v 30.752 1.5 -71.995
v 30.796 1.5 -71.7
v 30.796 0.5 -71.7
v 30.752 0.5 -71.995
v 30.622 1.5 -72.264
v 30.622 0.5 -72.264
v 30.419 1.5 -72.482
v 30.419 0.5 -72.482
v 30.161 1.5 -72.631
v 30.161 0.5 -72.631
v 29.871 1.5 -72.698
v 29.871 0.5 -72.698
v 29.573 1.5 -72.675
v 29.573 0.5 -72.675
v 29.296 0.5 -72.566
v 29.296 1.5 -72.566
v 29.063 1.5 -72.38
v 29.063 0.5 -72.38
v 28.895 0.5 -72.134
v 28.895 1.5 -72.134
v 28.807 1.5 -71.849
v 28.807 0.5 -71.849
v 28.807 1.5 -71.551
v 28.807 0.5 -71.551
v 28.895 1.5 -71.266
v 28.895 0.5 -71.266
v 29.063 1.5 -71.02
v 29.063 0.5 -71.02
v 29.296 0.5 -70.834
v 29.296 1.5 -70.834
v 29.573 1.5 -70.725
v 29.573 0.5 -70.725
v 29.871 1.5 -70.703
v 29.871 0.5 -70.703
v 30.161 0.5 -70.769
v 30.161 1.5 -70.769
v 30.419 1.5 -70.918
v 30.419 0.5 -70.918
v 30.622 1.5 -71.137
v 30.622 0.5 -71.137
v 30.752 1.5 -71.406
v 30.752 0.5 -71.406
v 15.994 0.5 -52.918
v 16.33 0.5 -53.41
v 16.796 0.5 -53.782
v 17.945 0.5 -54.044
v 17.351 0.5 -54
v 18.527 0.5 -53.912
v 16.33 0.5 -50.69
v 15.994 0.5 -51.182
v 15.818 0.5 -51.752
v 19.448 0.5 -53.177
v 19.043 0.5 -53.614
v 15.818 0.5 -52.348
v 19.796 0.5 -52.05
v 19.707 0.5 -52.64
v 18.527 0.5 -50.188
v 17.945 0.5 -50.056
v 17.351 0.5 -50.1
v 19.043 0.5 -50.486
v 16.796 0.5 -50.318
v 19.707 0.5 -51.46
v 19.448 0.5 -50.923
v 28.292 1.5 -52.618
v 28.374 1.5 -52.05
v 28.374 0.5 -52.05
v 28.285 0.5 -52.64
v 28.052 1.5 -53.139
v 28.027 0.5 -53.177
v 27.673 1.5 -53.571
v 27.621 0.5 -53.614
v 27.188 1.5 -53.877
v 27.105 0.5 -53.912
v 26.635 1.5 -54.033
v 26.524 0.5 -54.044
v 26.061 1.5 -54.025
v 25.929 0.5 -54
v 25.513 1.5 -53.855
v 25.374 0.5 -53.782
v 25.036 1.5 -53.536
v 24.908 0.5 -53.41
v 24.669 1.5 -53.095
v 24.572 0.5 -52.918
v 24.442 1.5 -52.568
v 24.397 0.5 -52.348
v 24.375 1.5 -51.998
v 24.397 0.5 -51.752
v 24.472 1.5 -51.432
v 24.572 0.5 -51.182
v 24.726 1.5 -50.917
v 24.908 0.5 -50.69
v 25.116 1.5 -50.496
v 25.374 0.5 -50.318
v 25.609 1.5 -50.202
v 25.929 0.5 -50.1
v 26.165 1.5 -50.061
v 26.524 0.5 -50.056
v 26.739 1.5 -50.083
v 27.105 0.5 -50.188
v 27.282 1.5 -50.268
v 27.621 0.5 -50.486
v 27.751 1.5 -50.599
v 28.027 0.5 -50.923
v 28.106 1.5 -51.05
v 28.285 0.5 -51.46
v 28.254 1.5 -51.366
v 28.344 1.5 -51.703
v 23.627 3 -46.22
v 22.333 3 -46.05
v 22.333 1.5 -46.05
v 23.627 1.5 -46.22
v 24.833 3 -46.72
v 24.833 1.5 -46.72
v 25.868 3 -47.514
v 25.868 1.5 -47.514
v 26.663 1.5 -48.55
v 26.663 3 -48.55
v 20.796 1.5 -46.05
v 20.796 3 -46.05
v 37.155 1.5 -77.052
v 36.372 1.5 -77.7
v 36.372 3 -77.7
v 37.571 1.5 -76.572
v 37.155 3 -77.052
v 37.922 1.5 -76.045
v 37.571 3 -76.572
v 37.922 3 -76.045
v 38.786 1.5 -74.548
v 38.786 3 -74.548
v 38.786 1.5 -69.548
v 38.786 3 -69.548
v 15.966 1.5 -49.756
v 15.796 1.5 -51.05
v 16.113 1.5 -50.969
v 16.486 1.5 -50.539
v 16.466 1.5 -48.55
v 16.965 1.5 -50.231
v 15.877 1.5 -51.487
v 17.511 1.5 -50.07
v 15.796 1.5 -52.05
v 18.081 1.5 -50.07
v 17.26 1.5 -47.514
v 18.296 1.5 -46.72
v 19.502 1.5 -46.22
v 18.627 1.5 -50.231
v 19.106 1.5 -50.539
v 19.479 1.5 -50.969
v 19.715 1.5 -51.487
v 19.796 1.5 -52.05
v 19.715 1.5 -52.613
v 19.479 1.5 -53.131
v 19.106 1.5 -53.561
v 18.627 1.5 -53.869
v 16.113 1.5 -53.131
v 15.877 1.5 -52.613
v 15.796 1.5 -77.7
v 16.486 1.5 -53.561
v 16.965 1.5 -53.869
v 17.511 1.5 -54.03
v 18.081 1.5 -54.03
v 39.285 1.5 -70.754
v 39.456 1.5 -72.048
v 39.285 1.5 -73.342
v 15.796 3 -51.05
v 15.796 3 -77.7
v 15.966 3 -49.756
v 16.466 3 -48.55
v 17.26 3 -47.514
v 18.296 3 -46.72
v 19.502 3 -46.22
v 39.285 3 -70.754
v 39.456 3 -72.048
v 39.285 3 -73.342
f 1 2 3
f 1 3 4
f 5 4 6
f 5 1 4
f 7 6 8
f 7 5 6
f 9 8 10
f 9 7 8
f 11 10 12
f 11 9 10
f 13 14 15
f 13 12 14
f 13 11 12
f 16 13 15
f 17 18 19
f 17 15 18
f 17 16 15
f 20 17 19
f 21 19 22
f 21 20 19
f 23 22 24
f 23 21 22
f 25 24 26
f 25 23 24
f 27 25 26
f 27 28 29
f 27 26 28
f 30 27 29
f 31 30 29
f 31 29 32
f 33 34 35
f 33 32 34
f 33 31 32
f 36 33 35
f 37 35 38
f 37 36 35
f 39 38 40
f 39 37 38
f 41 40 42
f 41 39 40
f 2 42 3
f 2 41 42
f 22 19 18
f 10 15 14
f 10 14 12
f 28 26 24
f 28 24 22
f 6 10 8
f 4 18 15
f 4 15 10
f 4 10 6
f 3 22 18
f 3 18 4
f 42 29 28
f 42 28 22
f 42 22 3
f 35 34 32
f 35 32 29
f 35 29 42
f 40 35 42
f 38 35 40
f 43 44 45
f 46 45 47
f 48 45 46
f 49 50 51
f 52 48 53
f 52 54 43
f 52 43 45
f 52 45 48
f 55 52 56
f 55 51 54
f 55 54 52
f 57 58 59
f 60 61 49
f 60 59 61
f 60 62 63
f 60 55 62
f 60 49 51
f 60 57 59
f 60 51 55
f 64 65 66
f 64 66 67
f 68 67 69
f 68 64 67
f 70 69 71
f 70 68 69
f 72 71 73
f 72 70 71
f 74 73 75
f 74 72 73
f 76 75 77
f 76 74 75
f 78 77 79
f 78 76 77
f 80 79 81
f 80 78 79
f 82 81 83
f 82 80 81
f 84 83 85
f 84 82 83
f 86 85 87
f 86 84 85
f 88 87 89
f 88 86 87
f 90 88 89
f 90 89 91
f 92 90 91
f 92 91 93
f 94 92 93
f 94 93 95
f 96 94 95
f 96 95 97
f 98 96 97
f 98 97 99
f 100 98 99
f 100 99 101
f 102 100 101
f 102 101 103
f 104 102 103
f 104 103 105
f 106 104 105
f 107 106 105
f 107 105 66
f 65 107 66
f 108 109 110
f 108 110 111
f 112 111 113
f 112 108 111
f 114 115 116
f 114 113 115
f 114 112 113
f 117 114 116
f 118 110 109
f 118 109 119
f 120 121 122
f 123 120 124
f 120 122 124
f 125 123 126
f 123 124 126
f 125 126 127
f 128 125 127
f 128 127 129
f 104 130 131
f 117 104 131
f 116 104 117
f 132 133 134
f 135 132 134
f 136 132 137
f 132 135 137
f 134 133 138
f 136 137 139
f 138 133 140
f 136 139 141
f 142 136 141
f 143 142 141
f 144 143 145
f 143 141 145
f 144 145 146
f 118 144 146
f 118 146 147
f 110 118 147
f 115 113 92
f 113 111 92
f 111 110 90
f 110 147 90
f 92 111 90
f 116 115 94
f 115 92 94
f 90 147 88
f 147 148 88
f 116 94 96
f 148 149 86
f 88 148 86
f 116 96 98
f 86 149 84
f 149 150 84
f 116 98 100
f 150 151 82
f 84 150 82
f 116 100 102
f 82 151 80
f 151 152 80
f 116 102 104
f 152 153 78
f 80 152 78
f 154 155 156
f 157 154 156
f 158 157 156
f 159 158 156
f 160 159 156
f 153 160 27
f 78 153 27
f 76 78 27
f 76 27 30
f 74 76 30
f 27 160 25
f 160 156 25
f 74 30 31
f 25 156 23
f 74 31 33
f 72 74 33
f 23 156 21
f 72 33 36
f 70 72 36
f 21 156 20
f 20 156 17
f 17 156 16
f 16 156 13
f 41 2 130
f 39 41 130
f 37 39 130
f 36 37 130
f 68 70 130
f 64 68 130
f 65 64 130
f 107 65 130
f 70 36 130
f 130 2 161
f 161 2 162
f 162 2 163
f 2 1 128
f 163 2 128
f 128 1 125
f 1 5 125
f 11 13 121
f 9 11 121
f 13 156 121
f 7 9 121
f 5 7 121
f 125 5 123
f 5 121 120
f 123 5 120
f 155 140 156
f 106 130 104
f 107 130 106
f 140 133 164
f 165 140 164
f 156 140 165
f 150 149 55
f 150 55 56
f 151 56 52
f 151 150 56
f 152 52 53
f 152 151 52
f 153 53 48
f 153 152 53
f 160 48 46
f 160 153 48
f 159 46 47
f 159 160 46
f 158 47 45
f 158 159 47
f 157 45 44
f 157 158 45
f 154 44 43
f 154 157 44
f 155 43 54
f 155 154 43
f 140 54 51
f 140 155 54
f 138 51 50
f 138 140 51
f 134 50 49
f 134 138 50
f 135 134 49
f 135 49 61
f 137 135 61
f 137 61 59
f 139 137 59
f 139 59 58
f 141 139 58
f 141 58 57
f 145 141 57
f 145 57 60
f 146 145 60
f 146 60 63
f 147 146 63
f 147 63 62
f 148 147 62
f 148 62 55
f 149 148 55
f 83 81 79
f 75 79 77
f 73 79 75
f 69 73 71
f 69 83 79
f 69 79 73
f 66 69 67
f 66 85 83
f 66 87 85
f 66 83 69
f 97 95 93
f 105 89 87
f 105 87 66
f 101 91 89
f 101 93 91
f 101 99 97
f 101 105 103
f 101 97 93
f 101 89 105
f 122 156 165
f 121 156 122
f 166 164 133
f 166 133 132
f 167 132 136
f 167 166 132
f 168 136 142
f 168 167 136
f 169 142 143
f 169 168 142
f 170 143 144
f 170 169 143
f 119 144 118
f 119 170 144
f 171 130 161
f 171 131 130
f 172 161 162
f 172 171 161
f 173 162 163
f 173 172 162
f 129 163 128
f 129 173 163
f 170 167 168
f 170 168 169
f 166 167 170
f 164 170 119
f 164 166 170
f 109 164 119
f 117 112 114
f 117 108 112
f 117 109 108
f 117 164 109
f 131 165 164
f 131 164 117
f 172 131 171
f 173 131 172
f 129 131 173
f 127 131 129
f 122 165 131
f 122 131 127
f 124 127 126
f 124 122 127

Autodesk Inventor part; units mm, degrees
ref_plane "YZ Plane" through (0, 0, 0) normal (1, 0, 0) x (0, 1, 0)
ref_plane "XZ Plane" through (0, 0, 0) normal (0, 1, 0) x (-1, 0, 0)
ref_plane "XY Plane" through (0, 0, 0) normal (0, 0, 1) x (1, 0, 0)
sketch "スケッチ1" plane through (0, 0, 0) normal (0, 1, 0) x (-1, 0, 0)
  line L0 (75, 0) -> (105, -51.9615)
  line L1 (-75, 0) -> (-105, -51.9615)
  line L2 (0, -218.2384) -> (0, 36.3731)
  line L3 (147, 0) -> (-147, 0)
  line L4 (37.5, -27) -> (-37.5, -27)
  line L5 (105, -51.9615) -> (30, -181.8653)
  line L6 (30, -181.8653) -> (-30, -181.8653)
  line L7 (-30, -181.8653) -> (-105, -51.9615)
  line L8 (75, 0) -> (-75, 0)
  line L9 (-25.3673, -135.8894) -> (-62.8673, -70.9375)
  line L10 (25.3673, -135.8894) -> (62.8673, -70.9375)
  line L11 (-37.5, -27) -> (-27.5, -27)
  line L12 (-27.5, -27) -> (-27.5, -39)
  line L13 (-27.5, -39) -> (-37.5, -39)
  line L14 (-37.5, -39) -> (-37.5, -27)
  line L15 (37.5, -27) -> (27.5, -27)
  line L16 (27.5, -27) -> (27.5, -39)
  line L17 (27.5, -39) -> (37.5, -39)
  line L18 (37.5, -39) -> (37.5, -27)
  line L19 (0, -77.9423) -> (44.1173, -103.4134) construction
  line L20 (0, -77.9423) -> (-44.1173, -103.4134) construction
  line L21 (-44.1173, -103.4134) -> (-67.5, -116.9134) construction
  line L22 (-57.8673, -79.5977) -> (-47.475, -73.5977)
  line L23 (-52.475, -64.9375) -> (-62.8673, -70.9375)
  line L24 (-62.8673, -70.9375) -> (-57.8673, -79.5977)
  line L25 (-47.475, -73.5977) -> (-52.475, -64.9375)
  line L26 (-25.3673, -135.8894) -> (-30.3673, -127.2291)
  line L27 (-19.975, -121.2291) -> (-14.975, -129.8894)
  line L28 (-14.975, -129.8894) -> (-25.3673, -135.8894)
  line L29 (-30.3673, -127.2291) -> (-19.975, -121.2291)
  line L30 (30.3673, -127.2291) -> (19.975, -121.2291)
  line L31 (14.975, -129.8894) -> (25.3673, -135.8894)
  line L32 (25.3673, -135.8894) -> (30.3673, -127.2291)
  line L33 (19.975, -121.2291) -> (14.975, -129.8894)
  line L34 (62.8673, -70.9375) -> (57.8673, -79.5977)
  line L35 (47.475, -73.5977) -> (52.475, -64.9375)
  line L36 (52.475, -64.9375) -> (62.8673, -70.9375)
  line L37 (57.8673, -79.5977) -> (47.475, -73.5977)
  line L38 (62.8673, -70.9375) -> (37.5, -27)
  line L39 (-37.5, -27) -> (-62.8673, -70.9375)
  line L40 (-25.3673, -135.8894) -> (25.3673, -135.8894)
  line L41 (-25.3673, -135.8894) -> (-25.3673, -181.8653)
  line L42 (25.3673, -135.8894) -> (25.3673, -181.8653)
  line L43 (-25.3673, -135.8894) -> (-48.75, -149.3894)
  line L44 (25.3673, -135.8894) -> (48.75, -149.3894)
  point P0 (0, 0)
  point P1 (0, 0)
  point P2 (0, -27)
  dimension "d1" = 150
  dimension "d2" = 60
  dimension "d3" = 60
  dimension "d4" = 27
  dimension "d5" = 75
  dimension "d6" = 60
  dimension "d7" = 27
  dimension "d8" = 10
  dimension "d9" = 12
  dimension "d10" = 10
  dimension "d11" = 12
  dimension "d14" = 360
extrude "プレート1" add sketch "スケッチ1" along normal blind 1.5 contours L5 L6 L42 L44 | L4 L16 L17 L18 L38 L36 L35 L37 L10 L30 L33 L31 L40 L2 | L2 L40 L28 L27 L29 L9 L22 L25 L23 L39 L14 L13 L12 L4 | L31 L33 L30 L10 | L42 L6 L2 L40 | L2 L6 L41 L40 | L4 L18 L17 L16 | L12 L13 L14 L4 | L9 L29 L27 L28 | L41 L6 L7 L43 | L37 L35 L36 L10 | L23 L25 L22 L9
sketch "スケッチ2" plane through (0, 0, 0) normal (0, -1, 0) x (1, 0, 0)
  line L0 (23.3798, -38.55) -> (-23.3798, -38.55) projected
  line L1 (8.2, -46.6) -> (-8.2, -46.6) projected
  arc A0 (-21.1, -27) -> (-23.3798, -38.55) centre (-21.1, -33) ccw projected
  line L2 (-27.5, -27) -> (-27.5, -39) projected
  line L3 (27.5, -39) -> (27.5, -27) projected
  line L4 (-27.5, -39) -> (-27.5, -40.55)
  line L5 (-27.5, -40.55) -> (-10.2, -40.55)
  line L6 (-10.2, -40.55) -> (-10.2, -48.6)
  line L7 (-10.2, -48.6) -> (10.2, -48.6)
  line L8 (10.2, -48.6) -> (10.2, -40.55)
  line L9 (10.2, -40.55) -> (27.5, -40.55)
  line L10 (27.5, -40.55) -> (27.5, -39)
  line L11 (-37.5, -27) -> (-27.5, -27) projected
  line L12 (-37.5, -27) -> (37.5, -27) projected
  line L13 (-20.3112, -101.4469) -> (-30.5112, -83.78)
  line L14 (-27.2827, -105.4719) -> (-20.3112, -101.4469)
  line L15 (-18.6327, -120.4541) -> (-27.2827, -105.4719)
  line L16 (-19.975, -121.2291) -> (-18.6327, -120.4541)
  line L17 (-37.4827, -87.805) -> (-46.1327, -72.8227)
  line L18 (-46.1327, -72.8227) -> (-47.475, -73.5977)
  line L19 (-30.5112, -83.78) -> (-37.4827, -87.805)
  line L20 (30.5112, -83.78) -> (20.3112, -101.4469)
  line L21 (37.4827, -87.805) -> (30.5112, -83.78)
  line L22 (46.1327, -72.8227) -> (37.4827, -87.805)
  line L23 (47.475, -73.5977) -> (46.1327, -72.8227)
  line L24 (27.2827, -105.4719) -> (18.6327, -120.4541)
  line L25 (18.6327, -120.4541) -> (19.975, -121.2291)
  line L26 (20.3112, -101.4469) -> (27.2827, -105.4719)
  line L27 (-47.475, -73.5977) -> (-57.8673, -79.5977)
  line L28 (-57.8673, -79.5977) -> (-30.3673, -127.2291)
  line L29 (-30.3673, -127.2291) -> (-19.975, -121.2291)
  line L30 (19.975, -121.2291) -> (30.3673, -127.2291)
  line L31 (30.3673, -127.2291) -> (57.8673, -79.5977)
  line L32 (57.8673, -79.5977) -> (47.475, -73.5977)
  point P0 (0, 0)
  point P1 (0, -77.9423)
  point P2 (-23.0432, -100.7148)
  point P3 (-33.5673, -121.6866)
  point P4 (-22.4248, -117.8859)
  point P5 (-25.3673, -135.8894)
  point P6 (-28.3712, -118.6866)
  point P7 (-31.2432, -86.512)
  point P8 (-45.8046, -77.3909)
  point P9 (-62.8673, -70.9375)
  point P10 (31.2432, -86.512)
  point P11 (54.6673, -85.1403)
  point P12 (45.8046, -77.3909)
  point P13 (62.8673, -70.9375)
  point P14 (49.4712, -82.1403)
  point P15 (23.0432, -100.7148)
  point P16 (22.4248, -117.8859)
  point P17 (25.3673, -135.8894)
  dimension "d17" = 2
  dimension "d18" = 2
  dimension "d19" = 2
  dimension "d20" = 2
  dimension "d26" = 360
extrude "切り取り1" cut sketch "スケッチ2" against normal blind 1.5
fillet "フィレット1" radius 1.5 18 edges at (-10.2, 0.75, -48.6) (-10.2, 0.75, -40.55) (-27.5, 0.75, -40.55) (10.2, 0.75, -48.6) (10.2, 0.75, -40.55) (27.5, 0.75, -40.55) (-30.5112, 0.75, -83.78) (-46.1327, 0.75, -72.8227) (-20.3112, 0.75, -101.4469) (-27.2827, 0.75, -105.4719) (-37.4827, 0.75, -87.805) (-18.6327, 0.75, -120.4541) (20.3112, 0.75, -101.4469) (27.2827, 0.75, -105.4719) (18.6327, 0.75, -120.4541) (30.5112, 0.75, -83.78) (37.4827, 0.75, -87.805) (46.1327, 0.75, -72.8227)
sketch "スケッチ3" plane through (0, 0, 0) normal (0, -1, 0) x (1, 0, 0)
  circle A0 centre (40.9875, -45.0405) radius 1.6 projected
  circle A1 centre (48.9875, -58.8969) radius 1.6 projected
  circle A2 centre (8, -129.8894) radius 1.6 projected
  circle A3 centre (-8, -129.8894) radius 1.6 projected
  circle A4 centre (-48.9875, -58.8969) radius 1.6 projected
  circle A5 centre (-40.9875, -45.0405) radius 1.6 projected
  point P0 (0, 0)
extrude "切り取り2" cut sketch "スケッチ3" against normal blind 1.5
sketch "スケッチ4" plane through (0, 0, 0) normal (0, -1, 0) x (1, 0, 0)
  circle A0 centre (10, -176.8653) radius 1.35 projected
  circle A1 centre (21.2333, -145.0496) radius 1.6 projected
  circle A2 centre (10, -143.8894) radius 1.6 projected
  line L0 (52.75, -142.4612) -> (30, -181.8653) projected
  line L1 (52.75, -142.4612) -> (33.6974, -131.4612) projected
  line L2 (33.6974, -131.4612) -> (27.1974, -142.7195) projected
  line L3 (27.1974, -142.7195) -> (20.5635, -138.8894) projected
  line L4 (20.5635, -138.8894) -> (5, -138.8894) projected
  line L5 (5, -138.8894) -> (5, -181.8653) projected
  line L6 (30, -181.8653) -> (5, -181.8653) projected
  circle A3 centre (-10, -176.8653) radius 1.35 projected
  circle A4 centre (-21.2333, -145.0496) radius 1.6 projected
  circle A5 centre (-10, -143.8894) radius 1.6 projected
  line L7 (-12.9295, -171.4323) -> (-35.4295, -132.4612) projected
  line L8 (-30.25, -181.4323) -> (-12.9295, -171.4323) projected
  line L9 (-30, -181.8653) -> (-30.25, -181.4323) projected
  line L10 (-30, -181.8653) -> (-5, -181.8653) projected
  line L11 (-5, -181.8653) -> (-5, -138.8894) projected
  line L12 (-5, -138.8894) -> (-20.5635, -138.8894) projected
  line L13 (-20.5635, -138.8894) -> (-27.1974, -142.7195) projected
  line L14 (-33.6974, -131.4612) -> (-27.1974, -142.7195) projected
  line L15 (-35.4295, -132.4612) -> (-33.6974, -131.4612) projected
  point P0 (0, 0)
extrude "切り取り3" cut sketch "スケッチ4" against normal blind 1.5 contours A0 | A1 | A2 | A3 | A4 | A5
sketch "スケッチ5" plane through (0, 1.5, 0) normal (0, 1, 0) x (1, 0, 0)
  line L0 (-19.975, 121.2291) -> (19.975, 121.2291) projected
  line L1 (47.475, 73.5977) -> (27.5, 39) projected
  line L2 (-47.475, 73.5977) -> (-27.5, 39) projected
  point P0 (0, 0)
sketch "スケッチ6" plane through (0, 1.5, 0) normal (0, 1, 0) x (1, 0, 0)
  line L0 (-26.0855, 44.55) -> (-41.9613, 72.0477)
  line L1 (-41.9613, 72.0477) -> (-36.0186, 82.3409)
  line L2 (-36.0186, 82.3409) -> (-29.0471, 78.3159)
  line L3 (-29.0471, 78.3159) -> (-14.8471, 102.911)
  line L4 (-14.8471, 102.911) -> (-21.8186, 106.936)
  line L5 (-21.8186, 106.936) -> (-15.8758, 117.2291)
  line L6 (-15.8758, 117.2291) -> (15.8758, 117.2291)
  line L7 (15.8758, 117.2291) -> (21.8186, 106.936)
  line L8 (21.8186, 106.936) -> (14.8471, 102.911)
  line L9 (14.8471, 102.911) -> (29.0471, 78.3159)
  line L10 (29.0471, 78.3159) -> (36.0186, 82.3409)
  line L11 (36.0186, 82.3409) -> (41.9613, 72.0477)
  line L12 (41.9613, 72.0477) -> (26.0855, 44.55)
  line L13 (26.0855, 44.55) -> (14.2, 44.55)
  line L14 (14.2, 44.55) -> (14.2, 52.6)
  line L15 (14.2, 52.6) -> (-14.2, 52.6)
  line L16 (-14.2, 52.6) -> (-14.2, 44.55)
  line L17 (-14.2, 44.55) -> (-26.0855, 44.55)
  line L18 (-47.475, 73.5977) -> (-27.5, 39) projected
  line L19 (-38.2327, 86.5059) -> (-45.3827, 74.1218) projected
  line L20 (-31.8102, 84.53) -> (-36.1836, 87.055) projected
  line L21 (-21.0612, 100.1479) -> (-29.7612, 85.079) projected
  line L22 (-25.9836, 104.7219) -> (-21.6102, 102.1969) projected
  line L23 (-19.3827, 119.1551) -> (-26.5327, 106.7709) projected
  line L24 (-19.975, 121.2291) -> (19.975, 121.2291) projected
  line L25 (47.475, 73.5977) -> (27.5, 39) projected
  line L26 (26.5327, 106.7709) -> (19.3827, 119.1551) projected
  line L27 (21.6102, 102.1969) -> (25.9836, 104.7219) projected
  line L28 (29.7612, 85.079) -> (21.0612, 100.1479) projected
  line L29 (36.1836, 87.055) -> (31.8102, 84.53) projected
  line L30 (45.3827, 74.1218) -> (38.2327, 86.5059) projected
  line L31 (11.7, 40.55) -> (26, 40.55) projected
  line L32 (10.2, 47.1) -> (10.2, 42.05) projected
  line L33 (-8.7, 48.6) -> (8.7, 48.6) projected
  line L34 (-10.2, 42.05) -> (-10.2, 47.1) projected
  line L35 (-26, 40.55) -> (-11.7, 40.55) projected
  line L36 (0, 48.6) -> (0, 121.2291)
  line L37 (-25.4112, 92.6134) -> (-31.0836, 95.8884) construction
  point P0 (0, 0)
  dimension "d32" = 4
  dimension "d33" = 4
  dimension "d34" = 4
  dimension "d35" = 4
  dimension "d36" = 4
  dimension "d37" = 4
  dimension "d38" = 4
  dimension "d39" = 4
  dimension "d40" = 4
extrude "切り取り4" cut sketch "スケッチ6" against normal blind 1.5
fillet "フィレット2" radius 5 9 edges at (-14.2, 0.75, -44.55) (-26.0855, 0.75, -44.55) (-41.9613, 0.75, -72.0477) (-36.0186, 0.75, -82.3409) (-21.8186, 0.75, -106.936) (-15.8758, 0.75, -117.2291) (-14.2, 0.75, -52.6) (-29.0471, 0.75, -78.3159) (-14.8471, 0.75, -102.911)
mirror "ミラー1" about plane through (0, 0, 0) normal (1, 0, 0) of "フィレット2"
sketch "スケッチ7" plane through (0, 1.5, 0) normal (0, 1, 0) x (1, 0, 0)
  arc A0 (18.2848, 105.0066) -> (17.2511, 98.7471) centre (21.5812, 101.2471) ccw projected
  line L0 (17.2511, 98.7471) -> (26.643, 82.4797) projected
  arc A1 (26.643, 82.4797) -> (32.5808, 80.2452) centre (30.9732, 84.9797) ccw projected
  arc A2 (38.5186, 78.0107) -> (32.5808, 80.2452) centre (34.1884, 75.5107) ccw projected
  line L1 (38.5186, 78.0107) -> (40.5179, 74.5477) projected
  arc A3 (40.5179, 69.5477) -> (40.5179, 74.5477) centre (36.1878, 72.0477) ccw projected
  line L2 (40.5179, 69.5477) -> (27.5289, 47.05) projected
  arc A4 (23.1987, 44.55) -> (27.5289, 47.05) centre (23.1987, 49.55) ccw projected
  line L3 (23.1987, 44.55) -> (19.2, 44.55) projected
  arc A5 (14.296, 48.575) -> (19.2, 44.55) centre (19.2, 49.55) ccw projected
  arc A6 (14.296, 48.575) -> (9.392, 52.6) centre (9.392, 47.6) ccw projected
  line L4 (9.392, 52.6) -> (-9.392, 52.6) projected
  arc A7 (-9.392, 52.6) -> (-14.296, 48.575) centre (-9.392, 47.6) ccw projected
  arc A8 (-19.2, 44.55) -> (-14.296, 48.575) centre (-19.2, 49.55) ccw projected
  line L5 (-19.2, 44.55) -> (-23.1987, 44.55) projected
  arc A9 (-27.5289, 47.05) -> (-23.1987, 44.55) centre (-23.1987, 49.55) ccw projected
  line L6 (-27.5289, 47.05) -> (-40.5179, 69.5477) projected
  arc A10 (-40.5179, 74.5477) -> (-40.5179, 69.5477) centre (-36.1878, 72.0477) ccw projected
  line L7 (-40.5179, 74.5477) -> (-38.5186, 78.0107) projected
  arc A11 (-32.5808, 80.2452) -> (-38.5186, 78.0107) centre (-34.1884, 75.5107) ccw projected
  arc A12 (-32.5808, 80.2452) -> (-26.643, 82.4797) centre (-30.9732, 84.9797) ccw projected
  line L8 (-26.643, 82.4797) -> (-17.2511, 98.7471) projected
  arc A13 (-17.2511, 98.7471) -> (-18.2848, 105.0066) centre (-21.5812, 101.2471) ccw projected
  arc A14 (-19.3186, 111.2661) -> (-18.2848, 105.0066) centre (-14.9884, 108.7661) ccw projected
  line L9 (-19.3186, 111.2661) -> (-17.3192, 114.7291) projected
  arc A15 (-12.9891, 117.2291) -> (-17.3192, 114.7291) centre (-12.9891, 112.2291) ccw projected
  line L10 (-12.9891, 117.2291) -> (12.9891, 117.2291) projected
  arc A16 (17.3192, 114.7291) -> (12.9891, 117.2291) centre (12.9891, 112.2291) ccw projected
  line L11 (17.3192, 114.7291) -> (19.3186, 111.2661) projected
  arc A17 (18.2848, 105.0066) -> (19.3186, 111.2661) centre (14.9884, 108.7661) ccw projected
  circle A18 centre (21.2333, 145.0496) radius 1.6 projected
  circle A19 centre (-10, 143.8894) radius 1.6 projected
  circle A20 centre (-10, 176.8653) radius 1.35 projected
  circle A21 centre (-21.2333, 145.0496) radius 1.6 projected
  circle A22 centre (10, 176.8653) radius 1.35 projected
  circle A23 centre (10, 143.8894) radius 1.6 projected
  circle A24 centre (-48.9875, 58.8969) radius 1.6 projected
  circle A25 centre (8, 129.8894) radius 1.6 projected
  circle A26 centre (40.9875, 45.0405) radius 1.6 projected
  circle A27 centre (48.9875, 58.8969) radius 1.6 projected
  circle A28 centre (-8, 129.8894) radius 1.6 projected
  circle A29 centre (-40.9875, 45.0405) radius 1.6 projected
  arc A30 (38.2327, 86.5059) -> (36.1836, 87.055) centre (36.9336, 85.7559) ccw projected
  line L12 (36.1836, 87.055) -> (31.8102, 84.53) projected
  arc A31 (29.7612, 85.079) -> (31.8102, 84.53) centre (31.0602, 85.829) ccw projected
  line L13 (29.7612, 85.079) -> (21.0612, 100.1479) projected
  arc A32 (21.6102, 102.1969) -> (21.0612, 100.1479) centre (22.3602, 100.8979) ccw projected
  line L14 (21.6102, 102.1969) -> (25.9836, 104.7219) projected
  arc A33 (25.9836, 104.7219) -> (26.5327, 106.7709) centre (25.2336, 106.0209) ccw projected
  line L15 (26.5327, 106.7709) -> (19.3827, 119.1551) projected
  arc A34 (19.9317, 121.2041) -> (19.3827, 119.1551) centre (20.6817, 119.9051) ccw projected
  line L16 (19.9317, 121.2041) -> (30.3673, 127.2291) projected
  line L17 (25.3673, 135.8894) -> (30.3673, 127.2291) projected
  line L18 (48.75, 149.3894) -> (25.3673, 135.8894) projected
  line L19 (30, 181.8653) -> (48.75, 149.3894) projected
  line L20 (-30, 181.8653) -> (30, 181.8653) projected
  line L21 (-48.75, 149.3894) -> (-30, 181.8653) projected
  line L22 (-25.3673, 135.8894) -> (-48.75, 149.3894) projected
  line L23 (-30.3673, 127.2291) -> (-25.3673, 135.8894) projected
  line L24 (-30.3673, 127.2291) -> (-19.9317, 121.2041) projected
  arc A35 (-19.3827, 119.1551) -> (-19.9317, 121.2041) centre (-20.6817, 119.9051) ccw projected
  line L25 (-19.3827, 119.1551) -> (-26.5327, 106.7709) projected
  arc A36 (-26.5327, 106.7709) -> (-25.9836, 104.7219) centre (-25.2336, 106.0209) ccw projected
  line L26 (-25.9836, 104.7219) -> (-21.6102, 102.1969) projected
  arc A37 (-21.0612, 100.1479) -> (-21.6102, 102.1969) centre (-22.3602, 100.8979) ccw projected
  line L27 (-21.0612, 100.1479) -> (-29.7612, 85.079) projected
  arc A38 (-31.8102, 84.53) -> (-29.7612, 85.079) centre (-31.0602, 85.829) ccw projected
  line L28 (-31.8102, 84.53) -> (-36.1836, 87.055) projected
  arc A39 (-36.1836, 87.055) -> (-38.2327, 86.5059) centre (-36.9336, 85.7559) ccw projected
  line L29 (-38.2327, 86.5059) -> (-45.3827, 74.1218) projected
  arc A40 (-47.4317, 73.5727) -> (-45.3827, 74.1218) centre (-46.6817, 74.8718) ccw projected
  line L30 (-47.4317, 73.5727) -> (-57.8673, 79.5977) projected
  line L31 (-62.8673, 70.9375) -> (-57.8673, 79.5977) projected
  line L32 (-37.5, 27) -> (-62.8673, 70.9375) projected
  line L33 (-27.5, 27) -> (-37.5, 27) projected
  line L34 (-27.5, 27) -> (-27.5, 39.05) projected
  arc A41 (-26, 40.55) -> (-27.5, 39.05) centre (-26, 39.05) ccw projected
  line L35 (-26, 40.55) -> (-11.7, 40.55) projected
  arc A42 (-11.7, 40.55) -> (-10.2, 42.05) centre (-11.7, 42.05) ccw projected
  line L36 (-10.2, 42.05) -> (-10.2, 47.1) projected
  arc A43 (-8.7, 48.6) -> (-10.2, 47.1) centre (-8.7, 47.1) ccw projected
  line L37 (-8.7, 48.6) -> (8.7, 48.6) projected
  arc A44 (10.2, 47.1) -> (8.7, 48.6) centre (8.7, 47.1) ccw projected
  line L38 (10.2, 47.1) -> (10.2, 42.05) projected
  arc A45 (10.2, 42.05) -> (11.7, 40.55) centre (11.7, 42.05) ccw projected
  line L39 (11.7, 40.55) -> (26, 40.55) projected
  arc A46 (27.5, 39.05) -> (26, 40.55) centre (26, 39.05) ccw projected
  line L40 (27.5, 39.05) -> (27.5, 27) projected
  line L41 (37.5, 27) -> (27.5, 27) projected
  line L42 (62.8673, 70.9375) -> (37.5, 27) projected
  line L43 (57.8673, 79.5977) -> (62.8673, 70.9375) projected
  line L44 (57.8673, 79.5977) -> (47.4317, 73.5727) projected
  arc A47 (45.3827, 74.1218) -> (47.4317, 73.5727) centre (46.6817, 74.8718) ccw projected
  line L45 (45.3827, 74.1218) -> (38.2327, 86.5059) projected
  line L46 (25.2195, 46.05) -> (15.796, 46.05)
  line L47 (15.796, 46.05) -> (15.796, 54.1)
  line L48 (15.796, 54.1) -> (-15.796, 54.1)
  line L49 (-15.796, 54.1) -> (-15.796, 46.05)
  line L50 (-15.796, 46.05) -> (-25.2195, 46.05)
  line L51 (-25.2195, 46.05) -> (-40.2293, 72.0477)
  line L52 (-40.2293, 72.0477) -> (-35.5175, 80.2087)
  line L53 (-35.5175, 80.2087) -> (-28.546, 76.1837)
  line L54 (-28.546, 76.1837) -> (-12.75, 103.5432)
  line L55 (-12.75, 103.5432) -> (-19.7215, 107.5682)
  line L56 (-19.7215, 107.5682) -> (-15.0098, 115.7291)
  line L57 (-15.0098, 115.7291) -> (15.0098, 115.7291)
  line L58 (15.0098, 115.7291) -> (19.7215, 107.5682)
  line L59 (19.7215, 107.5682) -> (12.75, 103.5432)
  line L60 (12.75, 103.5432) -> (28.546, 76.1837)
  line L61 (28.546, 76.1837) -> (35.5175, 80.2087)
  line L62 (35.5175, 80.2087) -> (40.2293, 72.0477)
  line L63 (40.2293, 72.0477) -> (25.2195, 46.05)
  line L64 (0, 54.1) -> (0, 115.7291) construction
  line L65 (0, 218.2384) -> (0, -36.3731) construction
  line L66 (40.5179, 69.5477) -> (27.5289, 47.05) projected
  line L67 (20.648, 89.8634) -> (0, 77.9423) construction
  line L68 (0, 54.1) -> (0, 77.9423) construction
  line L69 (17.3192, 114.7291) -> (19.3186, 111.2661) projected
  point P0 (0, 0)
  dimension "d44" = 1.5
  dimension "d45" = 1.5
  dimension "d46" = 1.5
  dimension "d47" = 1.5
  dimension "d48" = 1.5
  dimension "d49" = 1.5
  dimension "d50" = 1.5
  dimension "d51" = 1.5
extrude "押し出し1" cut sketch "スケッチ7" against normal through all contours A0 L0 A1 A2 L1 A3 L2 A4 L3 A5 A6 L4 A7 A8 L5 A9 L6 A10 L7 A11 A12 L8 A13 A14 L9 A15 L10 A16 L11 A17 | L45 A47 L44 L43 L42 L41 L40 A46 L39 A45 L38 A44 L37 A43 L36 A42 L35 A41 L34 L33 L32 L31 L30 A40 L29 A39 L28 A38 L27 A37 L26 A36 L25 A35 L24 L23 L22 L21 L20 L19 L18 L17 L16 A34 L15 A33 L14 A32 L13 A31 L12 A30 | L46 L47 L48 L49 L50 L51 L52 L53 L54 L55 L56 L57 L58 L59 L60 L61 L62 L63
extrude "押し出し2" add sketch "スケッチ7" along normal blind 1.5 contours L46 L47 L48 L49 L50 L51 L52 L53 L54 L55 L56 L57 L58 L59 L60 L61 L62 L63
sketch "スケッチ8" plane through (0, 3, 0) normal (0, 1, 0) x (1, 0, 0)
  line L0 (15, 59.1) -> (-15, 59.1)
  line L1 (-15, 59.1) -> (-15, 124.1)
  line L2 (-15, 124.1) -> (15, 124.1)
  line L3 (15, 124.1) -> (15, 59.1)
  line L4 (-15.796, 54.1) -> (15.796, 54.1) projected
  line L5 (15.0098, 115.7291) -> (-15.0098, 115.7291) projected
  line L6 (15, 59.1) -> (15, 54.1)
  line L7 (-15.796, 46.05) -> (-15.796, 54.1) projected
  line L8 (-25.2195, 46.05) -> (-15.796, 46.05) projected
  line L9 (-40.2293, 72.0477) -> (-25.2195, 46.05) projected
  line L10 (-35.5175, 80.2087) -> (-40.2293, 72.0477) projected
  line L11 (-28.546, 76.1837) -> (-35.5175, 80.2087) projected
  line L12 (-12.75, 103.5432) -> (-28.546, 76.1837) projected
  line L13 (-19.7215, 107.5682) -> (-12.75, 103.5432) projected
  line L14 (-15.0098, 115.7291) -> (-19.7215, 107.5682) projected
  line L15 (15.796, 54.1) -> (15.796, 114.3674)
  line L16 (19.7215, 107.5682) -> (15.0098, 115.7291) projected
  line L17 (12.75, 103.5432) -> (19.7215, 107.5682) projected
  point P0 (0, 0)
  point P1 (0, 59.1)
  point P2 (0, 54.1)
  point P3 (-15, 115.7291)
  point P4 (15, 115.7291)
  point P5 (-15, 104.8422)
  point P6 (-15, 99.6461)
  point P7 (15.796, 105.3017)
  dimension "d56" = 65
  dimension "d57" = 30
  dimension "d58" = 5
extrude "押し出し3" cut sketch "スケッチ8" against normal through all
fillet "フィレット4" radius 5 5 edges at (28.546, 2.25, -76.1837) (35.5175, 2.25, -80.2087) (40.2293, 2.25, -72.0477) (25.2195, 2.25, -46.05) (15.796, 2.25, -46.05)
fillet "フィレット5" radius 3 1 edges at (15.796, 2.25, -98.2674)
sketch "スケッチ9" plane through (0, 1.5, 0) normal (0, -1, 0) x (1, 0, 0)
  line L0 (11.5, -82.5) -> (11.5, -82.525) projected
  line L1 (11.5, -82.5) -> (14.13, -82.5) projected
  arc A0 (14.13, -82.5) -> (14.18, -82.45) centre (14.13, -82.45) ccw projected
  line L2 (14.18, -82.95) -> (14.18, -82.45) projected
  arc A1 (14.18, -82.95) -> (14.13, -82.9) centre (14.13, -82.95) ccw projected
  line L3 (11.5, -82.9) -> (14.13, -82.9) projected
  line L4 (11.5, -82.875) -> (11.5, -82.9) projected
  line L5 (11.11, -82.875) -> (11.5, -82.875) projected
  arc A2 (11.0667, -82.85) -> (11.11, -82.875) centre (11.11, -82.825) ccw projected
  arc A3 (11.0667, -82.85) -> (11.0234, -82.825) centre (11.0234, -82.875) ccw projected
  line L6 (10.96, -82.825) -> (11.0234, -82.825) projected
  line L7 (10.96, -82.575) -> (10.96, -82.825) projected
  line L8 (11.0234, -82.575) -> (10.96, -82.575) projected
  arc A4 (11.0234, -82.575) -> (11.0667, -82.55) centre (11.0234, -82.525) ccw projected
  arc A5 (11.11, -82.525) -> (11.0667, -82.55) centre (11.11, -82.575) ccw projected
  line L9 (11.5, -82.525) -> (11.11, -82.525) projected
  line L10 (13.14, -82.875) -> (13.14, -82.525) projected
  line L11 (13.14, -82.875) -> (13.2786, -82.875) projected
  line L12 (13.2786, -82.875) -> (13.2786, -82.525) projected
  line L13 (13.2786, -82.525) -> (13.14, -82.525) projected
  arc A6 (15.796, -87.0713) -> (21.3941, -88.5713) centre (18.796, -87.0713) ccw projected
  point P0 (0, 0)
  point P1 (14.18, -82.7)
  dimension "d64" = 4.3713
sketch "スケッチ10" plane through (0, 3, 0) normal (0, 1, 0) x (1, 0, 0)
  arc A0 (21.3941, 88.5713) -> (15.796, 87.0713) centre (18.796, 87.0713) ccw projected
  line L0 (18.796, 90.0713) -> (25.796, 90.0713)
  line L1 (25.796, 90.0713) -> (25.796, 80.9469)
  line L2 (26.046, 80.5138) -> (21.3941, 88.5713) projected
  line L3 (15.796, 87.0713) -> (15.796, 51.05) projected
  point P0 (0, 0)
  dimension "d65" = 10
extrude "押し出し4" add sketch "スケッチ10" against normal up to surface (1.5 mm away)
fillet "フィレット6" radius 2 1 edges at (25.796, 2.25, -90.0713)
sketch "スケッチ11" plane through (0, 1.5, 0) normal (0, -1, 0) x (1, 0, 0)
  point P0 (0, 0)
sketch "スケッチ12" plane through (0, 1.5, 0) normal (0, -1, 0) x (1, 0, 0)
  circle A0 centre (17.796, -52.05) radius 2
  circle A1 centre (26.3742, -52.05) radius 2
  circle A2 centre (17.796, -82.7003) radius 2
  line L0 (20.796, -46.05) -> (22.3327, -46.05) projected
  line L1 (15.796, -51.05) -> (15.796, -87.0713) projected
  line L2 (26.6628, -48.55) -> (38.7859, -69.5477) projected
  arc A3 (15.796, -87.0713) -> (21.3941, -88.5713) centre (18.796, -87.0713) ccw projected
  arc A4 (15.796, -87.0713) -> (18.796, -90.0713) centre (18.796, -87.0713) ccw projected
  point P0 (0, 0)
  dimension "d69" = 4
  dimension "d70" = 6
  dimension "d71" = 4.371
extrude "押し出し5" add sketch "スケッチ12" along normal blind 1
sketch "スケッチ13" plane through (0, 1.5, 0) normal (0, -1, 0) x (1, 0, 0)
  line L0 (15.796, -87.7003) -> (25.796, -87.7003)
  line L1 (25.796, -87.7003) -> (25.796, -77.7003)
  line L2 (25.796, -77.7003) -> (15.796, -77.7003)
  line L3 (15.796, -77.7003) -> (15.796, -87.7003)
  circle A0 centre (17.796, -82.7003) radius 2 projected
  line L4 (15.796, -50.05) -> (22.796, -50.05)
  line L5 (22.796, -50.05) -> (22.796, -77.7003)
  line L6 (22.796, -77.7003) -> (15.796, -77.7003)
  line L7 (15.796, -77.7003) -> (15.796, -50.05)
  line L8 (15.796, -52.05) -> (15.796, -82.7003) projected
  circle A1 centre (17.796, -52.05) radius 2 projected
  line L9 (25.796, -88.0713) -> (25.796, -80.9469) projected
  line L10 (22.6062, -41.5237) -> (16.544, -45.0237)
  line L11 (16.544, -45.0237) -> (38.2131, -82.5556)
  line L12 (38.2131, -82.5556) -> (44.2753, -79.0556)
  line L13 (44.2753, -79.0556) -> (22.6062, -41.5237)
  line L14 (28.1062, -51.05) -> (38.7859, -69.5477) projected
  line L15 (18.796, -90.0713) -> (23.796, -90.0713) projected
  arc A2 (23.796, -90.0713) -> (25.796, -88.0713) centre (23.796, -88.0713) ccw projected
  line L16 (15.796, -82.7003) -> (15.796, -87.0713) projected
  arc A3 (23.796, -90.0713) -> (25.796, -88.0713) centre (23.796, -88.0713) ccw projected
  line L17 (25.796, -88.0713) -> (25.796, -80.9469) projected
  line L18 (26.046, -80.5138) -> (25.796, -80.9469) projected
  arc A4 (31.9838, -78.2793) -> (26.046, -80.5138) centre (30.3761, -83.0138) ccw projected
  arc A5 (31.9838, -78.2793) -> (37.9215, -76.0448) centre (33.5914, -73.5448) ccw projected
  line L19 (38.7859, -74.5477) -> (37.9215, -76.0448) projected
  arc A6 (38.7859, -74.5477) -> (38.7859, -69.5477) centre (34.4558, -72.0477) ccw projected
  line L20 (28.1062, -51.05) -> (38.7859, -69.5477) projected
  circle A7 centre (26.3742, -52.05) radius 2 projected
  line L21 (26.6628, -48.55) -> (28.1062, -51.05) projected
  arc A8 (26.6628, -48.55) -> (22.3327, -46.05) centre (22.3327, -51.05) ccw projected
  line L22 (20.796, -46.05) -> (22.3327, -46.05) projected
  arc A9 (20.796, -46.05) -> (15.796, -51.05) centre (20.796, -51.05) ccw projected
  line L23 (15.796, -51.05) -> (15.796, -52.05) projected
  circle A10 centre (17.796, -52.05) radius 2 projected
  line L24 (15.796, -52.05) -> (15.796, -82.7003) projected
  circle A11 centre (17.796, -82.7003) radius 2 projected
  line L25 (15.796, -82.7003) -> (15.796, -87.0713) projected
  arc A12 (15.796, -87.0713) -> (18.796, -90.0713) centre (18.796, -87.0713) ccw projected
  line L26 (18.796, -90.0713) -> (23.796, -90.0713) projected
  line L27 (25.796, -77.7003) -> (36.3721, -77.7003)
  circle A13 centre (29.796, -71.7003) radius 1
  point P0 (0, 0)
  point P1 (35.6432, -78.1044)
  point P2 (35.4098, -77.7003)
  dimension "d74" = 5
  dimension "d75" = 10
  dimension "d76" = 7
  dimension "d77" = 7
  dimension "d80" = 7
  dimension "d81" = 6
  dimension "d82" = 2
extrude "押し出し6" cut sketch "スケッチ13" along normal mid plane 10 contours A0 | A12 L3 L2 L1 L0 | L0 L9 A2 L15 A12 | L1 L27 L11 A5 A4 L18 | L27 A5 L11
extrude "押し出し7" add sketch "スケッチ13" along normal blind 1 contours A13
equation "\"d3\" = d2"
equation "\"d7\" = d4"
equation "\"d19\" = d18"
equation "\"d21\" = Thickness"
equation "\"d28\" = Thickness"
equation "\"d30\" = Thickness"
equation "\"d33\" = d32"
equation "\"d34\" = d32"
equation "\"d35\" = d32"
equation "\"d36\" = d32"
equation "\"d37\" = d32"
equation "\"d38\" = d32"
equation "\"d39\" = d32"
equation "\"d40\" = d32"
equation "\"d41\" = Thickness"
equation "\"d45\" = d44"
equation "\"d46\" = d44"
equation "\"d47\" = d44"
equation "\"d48\" = d44"
equation "\"d49\" = d44"
equation "\"d50\" = d44"
equation "\"d51\" = d44"
equation "\"d16\" = Thickness"
equation "\"BendRadius\" = Thickness"
equation "\"BendReliefWidth\" = Thickness"
equation "\"BendReliefDepth\" = 0.5 * Thickness"
equation "\"CornerReliefSize\" = 4 * Thickness"
equation "\"MinimumRemnant\" = 2 * Thickness"
equation "\"TransitionRadius\" = BendRadius"
equation "\"JacobiRadiusSize\" = BendRadius"
equation "\"GapSize\" = Thickness"
equation "\"Thickness\" = 1.5"
properties part number "CORE_hat_outline_typeB_base_ver2"
